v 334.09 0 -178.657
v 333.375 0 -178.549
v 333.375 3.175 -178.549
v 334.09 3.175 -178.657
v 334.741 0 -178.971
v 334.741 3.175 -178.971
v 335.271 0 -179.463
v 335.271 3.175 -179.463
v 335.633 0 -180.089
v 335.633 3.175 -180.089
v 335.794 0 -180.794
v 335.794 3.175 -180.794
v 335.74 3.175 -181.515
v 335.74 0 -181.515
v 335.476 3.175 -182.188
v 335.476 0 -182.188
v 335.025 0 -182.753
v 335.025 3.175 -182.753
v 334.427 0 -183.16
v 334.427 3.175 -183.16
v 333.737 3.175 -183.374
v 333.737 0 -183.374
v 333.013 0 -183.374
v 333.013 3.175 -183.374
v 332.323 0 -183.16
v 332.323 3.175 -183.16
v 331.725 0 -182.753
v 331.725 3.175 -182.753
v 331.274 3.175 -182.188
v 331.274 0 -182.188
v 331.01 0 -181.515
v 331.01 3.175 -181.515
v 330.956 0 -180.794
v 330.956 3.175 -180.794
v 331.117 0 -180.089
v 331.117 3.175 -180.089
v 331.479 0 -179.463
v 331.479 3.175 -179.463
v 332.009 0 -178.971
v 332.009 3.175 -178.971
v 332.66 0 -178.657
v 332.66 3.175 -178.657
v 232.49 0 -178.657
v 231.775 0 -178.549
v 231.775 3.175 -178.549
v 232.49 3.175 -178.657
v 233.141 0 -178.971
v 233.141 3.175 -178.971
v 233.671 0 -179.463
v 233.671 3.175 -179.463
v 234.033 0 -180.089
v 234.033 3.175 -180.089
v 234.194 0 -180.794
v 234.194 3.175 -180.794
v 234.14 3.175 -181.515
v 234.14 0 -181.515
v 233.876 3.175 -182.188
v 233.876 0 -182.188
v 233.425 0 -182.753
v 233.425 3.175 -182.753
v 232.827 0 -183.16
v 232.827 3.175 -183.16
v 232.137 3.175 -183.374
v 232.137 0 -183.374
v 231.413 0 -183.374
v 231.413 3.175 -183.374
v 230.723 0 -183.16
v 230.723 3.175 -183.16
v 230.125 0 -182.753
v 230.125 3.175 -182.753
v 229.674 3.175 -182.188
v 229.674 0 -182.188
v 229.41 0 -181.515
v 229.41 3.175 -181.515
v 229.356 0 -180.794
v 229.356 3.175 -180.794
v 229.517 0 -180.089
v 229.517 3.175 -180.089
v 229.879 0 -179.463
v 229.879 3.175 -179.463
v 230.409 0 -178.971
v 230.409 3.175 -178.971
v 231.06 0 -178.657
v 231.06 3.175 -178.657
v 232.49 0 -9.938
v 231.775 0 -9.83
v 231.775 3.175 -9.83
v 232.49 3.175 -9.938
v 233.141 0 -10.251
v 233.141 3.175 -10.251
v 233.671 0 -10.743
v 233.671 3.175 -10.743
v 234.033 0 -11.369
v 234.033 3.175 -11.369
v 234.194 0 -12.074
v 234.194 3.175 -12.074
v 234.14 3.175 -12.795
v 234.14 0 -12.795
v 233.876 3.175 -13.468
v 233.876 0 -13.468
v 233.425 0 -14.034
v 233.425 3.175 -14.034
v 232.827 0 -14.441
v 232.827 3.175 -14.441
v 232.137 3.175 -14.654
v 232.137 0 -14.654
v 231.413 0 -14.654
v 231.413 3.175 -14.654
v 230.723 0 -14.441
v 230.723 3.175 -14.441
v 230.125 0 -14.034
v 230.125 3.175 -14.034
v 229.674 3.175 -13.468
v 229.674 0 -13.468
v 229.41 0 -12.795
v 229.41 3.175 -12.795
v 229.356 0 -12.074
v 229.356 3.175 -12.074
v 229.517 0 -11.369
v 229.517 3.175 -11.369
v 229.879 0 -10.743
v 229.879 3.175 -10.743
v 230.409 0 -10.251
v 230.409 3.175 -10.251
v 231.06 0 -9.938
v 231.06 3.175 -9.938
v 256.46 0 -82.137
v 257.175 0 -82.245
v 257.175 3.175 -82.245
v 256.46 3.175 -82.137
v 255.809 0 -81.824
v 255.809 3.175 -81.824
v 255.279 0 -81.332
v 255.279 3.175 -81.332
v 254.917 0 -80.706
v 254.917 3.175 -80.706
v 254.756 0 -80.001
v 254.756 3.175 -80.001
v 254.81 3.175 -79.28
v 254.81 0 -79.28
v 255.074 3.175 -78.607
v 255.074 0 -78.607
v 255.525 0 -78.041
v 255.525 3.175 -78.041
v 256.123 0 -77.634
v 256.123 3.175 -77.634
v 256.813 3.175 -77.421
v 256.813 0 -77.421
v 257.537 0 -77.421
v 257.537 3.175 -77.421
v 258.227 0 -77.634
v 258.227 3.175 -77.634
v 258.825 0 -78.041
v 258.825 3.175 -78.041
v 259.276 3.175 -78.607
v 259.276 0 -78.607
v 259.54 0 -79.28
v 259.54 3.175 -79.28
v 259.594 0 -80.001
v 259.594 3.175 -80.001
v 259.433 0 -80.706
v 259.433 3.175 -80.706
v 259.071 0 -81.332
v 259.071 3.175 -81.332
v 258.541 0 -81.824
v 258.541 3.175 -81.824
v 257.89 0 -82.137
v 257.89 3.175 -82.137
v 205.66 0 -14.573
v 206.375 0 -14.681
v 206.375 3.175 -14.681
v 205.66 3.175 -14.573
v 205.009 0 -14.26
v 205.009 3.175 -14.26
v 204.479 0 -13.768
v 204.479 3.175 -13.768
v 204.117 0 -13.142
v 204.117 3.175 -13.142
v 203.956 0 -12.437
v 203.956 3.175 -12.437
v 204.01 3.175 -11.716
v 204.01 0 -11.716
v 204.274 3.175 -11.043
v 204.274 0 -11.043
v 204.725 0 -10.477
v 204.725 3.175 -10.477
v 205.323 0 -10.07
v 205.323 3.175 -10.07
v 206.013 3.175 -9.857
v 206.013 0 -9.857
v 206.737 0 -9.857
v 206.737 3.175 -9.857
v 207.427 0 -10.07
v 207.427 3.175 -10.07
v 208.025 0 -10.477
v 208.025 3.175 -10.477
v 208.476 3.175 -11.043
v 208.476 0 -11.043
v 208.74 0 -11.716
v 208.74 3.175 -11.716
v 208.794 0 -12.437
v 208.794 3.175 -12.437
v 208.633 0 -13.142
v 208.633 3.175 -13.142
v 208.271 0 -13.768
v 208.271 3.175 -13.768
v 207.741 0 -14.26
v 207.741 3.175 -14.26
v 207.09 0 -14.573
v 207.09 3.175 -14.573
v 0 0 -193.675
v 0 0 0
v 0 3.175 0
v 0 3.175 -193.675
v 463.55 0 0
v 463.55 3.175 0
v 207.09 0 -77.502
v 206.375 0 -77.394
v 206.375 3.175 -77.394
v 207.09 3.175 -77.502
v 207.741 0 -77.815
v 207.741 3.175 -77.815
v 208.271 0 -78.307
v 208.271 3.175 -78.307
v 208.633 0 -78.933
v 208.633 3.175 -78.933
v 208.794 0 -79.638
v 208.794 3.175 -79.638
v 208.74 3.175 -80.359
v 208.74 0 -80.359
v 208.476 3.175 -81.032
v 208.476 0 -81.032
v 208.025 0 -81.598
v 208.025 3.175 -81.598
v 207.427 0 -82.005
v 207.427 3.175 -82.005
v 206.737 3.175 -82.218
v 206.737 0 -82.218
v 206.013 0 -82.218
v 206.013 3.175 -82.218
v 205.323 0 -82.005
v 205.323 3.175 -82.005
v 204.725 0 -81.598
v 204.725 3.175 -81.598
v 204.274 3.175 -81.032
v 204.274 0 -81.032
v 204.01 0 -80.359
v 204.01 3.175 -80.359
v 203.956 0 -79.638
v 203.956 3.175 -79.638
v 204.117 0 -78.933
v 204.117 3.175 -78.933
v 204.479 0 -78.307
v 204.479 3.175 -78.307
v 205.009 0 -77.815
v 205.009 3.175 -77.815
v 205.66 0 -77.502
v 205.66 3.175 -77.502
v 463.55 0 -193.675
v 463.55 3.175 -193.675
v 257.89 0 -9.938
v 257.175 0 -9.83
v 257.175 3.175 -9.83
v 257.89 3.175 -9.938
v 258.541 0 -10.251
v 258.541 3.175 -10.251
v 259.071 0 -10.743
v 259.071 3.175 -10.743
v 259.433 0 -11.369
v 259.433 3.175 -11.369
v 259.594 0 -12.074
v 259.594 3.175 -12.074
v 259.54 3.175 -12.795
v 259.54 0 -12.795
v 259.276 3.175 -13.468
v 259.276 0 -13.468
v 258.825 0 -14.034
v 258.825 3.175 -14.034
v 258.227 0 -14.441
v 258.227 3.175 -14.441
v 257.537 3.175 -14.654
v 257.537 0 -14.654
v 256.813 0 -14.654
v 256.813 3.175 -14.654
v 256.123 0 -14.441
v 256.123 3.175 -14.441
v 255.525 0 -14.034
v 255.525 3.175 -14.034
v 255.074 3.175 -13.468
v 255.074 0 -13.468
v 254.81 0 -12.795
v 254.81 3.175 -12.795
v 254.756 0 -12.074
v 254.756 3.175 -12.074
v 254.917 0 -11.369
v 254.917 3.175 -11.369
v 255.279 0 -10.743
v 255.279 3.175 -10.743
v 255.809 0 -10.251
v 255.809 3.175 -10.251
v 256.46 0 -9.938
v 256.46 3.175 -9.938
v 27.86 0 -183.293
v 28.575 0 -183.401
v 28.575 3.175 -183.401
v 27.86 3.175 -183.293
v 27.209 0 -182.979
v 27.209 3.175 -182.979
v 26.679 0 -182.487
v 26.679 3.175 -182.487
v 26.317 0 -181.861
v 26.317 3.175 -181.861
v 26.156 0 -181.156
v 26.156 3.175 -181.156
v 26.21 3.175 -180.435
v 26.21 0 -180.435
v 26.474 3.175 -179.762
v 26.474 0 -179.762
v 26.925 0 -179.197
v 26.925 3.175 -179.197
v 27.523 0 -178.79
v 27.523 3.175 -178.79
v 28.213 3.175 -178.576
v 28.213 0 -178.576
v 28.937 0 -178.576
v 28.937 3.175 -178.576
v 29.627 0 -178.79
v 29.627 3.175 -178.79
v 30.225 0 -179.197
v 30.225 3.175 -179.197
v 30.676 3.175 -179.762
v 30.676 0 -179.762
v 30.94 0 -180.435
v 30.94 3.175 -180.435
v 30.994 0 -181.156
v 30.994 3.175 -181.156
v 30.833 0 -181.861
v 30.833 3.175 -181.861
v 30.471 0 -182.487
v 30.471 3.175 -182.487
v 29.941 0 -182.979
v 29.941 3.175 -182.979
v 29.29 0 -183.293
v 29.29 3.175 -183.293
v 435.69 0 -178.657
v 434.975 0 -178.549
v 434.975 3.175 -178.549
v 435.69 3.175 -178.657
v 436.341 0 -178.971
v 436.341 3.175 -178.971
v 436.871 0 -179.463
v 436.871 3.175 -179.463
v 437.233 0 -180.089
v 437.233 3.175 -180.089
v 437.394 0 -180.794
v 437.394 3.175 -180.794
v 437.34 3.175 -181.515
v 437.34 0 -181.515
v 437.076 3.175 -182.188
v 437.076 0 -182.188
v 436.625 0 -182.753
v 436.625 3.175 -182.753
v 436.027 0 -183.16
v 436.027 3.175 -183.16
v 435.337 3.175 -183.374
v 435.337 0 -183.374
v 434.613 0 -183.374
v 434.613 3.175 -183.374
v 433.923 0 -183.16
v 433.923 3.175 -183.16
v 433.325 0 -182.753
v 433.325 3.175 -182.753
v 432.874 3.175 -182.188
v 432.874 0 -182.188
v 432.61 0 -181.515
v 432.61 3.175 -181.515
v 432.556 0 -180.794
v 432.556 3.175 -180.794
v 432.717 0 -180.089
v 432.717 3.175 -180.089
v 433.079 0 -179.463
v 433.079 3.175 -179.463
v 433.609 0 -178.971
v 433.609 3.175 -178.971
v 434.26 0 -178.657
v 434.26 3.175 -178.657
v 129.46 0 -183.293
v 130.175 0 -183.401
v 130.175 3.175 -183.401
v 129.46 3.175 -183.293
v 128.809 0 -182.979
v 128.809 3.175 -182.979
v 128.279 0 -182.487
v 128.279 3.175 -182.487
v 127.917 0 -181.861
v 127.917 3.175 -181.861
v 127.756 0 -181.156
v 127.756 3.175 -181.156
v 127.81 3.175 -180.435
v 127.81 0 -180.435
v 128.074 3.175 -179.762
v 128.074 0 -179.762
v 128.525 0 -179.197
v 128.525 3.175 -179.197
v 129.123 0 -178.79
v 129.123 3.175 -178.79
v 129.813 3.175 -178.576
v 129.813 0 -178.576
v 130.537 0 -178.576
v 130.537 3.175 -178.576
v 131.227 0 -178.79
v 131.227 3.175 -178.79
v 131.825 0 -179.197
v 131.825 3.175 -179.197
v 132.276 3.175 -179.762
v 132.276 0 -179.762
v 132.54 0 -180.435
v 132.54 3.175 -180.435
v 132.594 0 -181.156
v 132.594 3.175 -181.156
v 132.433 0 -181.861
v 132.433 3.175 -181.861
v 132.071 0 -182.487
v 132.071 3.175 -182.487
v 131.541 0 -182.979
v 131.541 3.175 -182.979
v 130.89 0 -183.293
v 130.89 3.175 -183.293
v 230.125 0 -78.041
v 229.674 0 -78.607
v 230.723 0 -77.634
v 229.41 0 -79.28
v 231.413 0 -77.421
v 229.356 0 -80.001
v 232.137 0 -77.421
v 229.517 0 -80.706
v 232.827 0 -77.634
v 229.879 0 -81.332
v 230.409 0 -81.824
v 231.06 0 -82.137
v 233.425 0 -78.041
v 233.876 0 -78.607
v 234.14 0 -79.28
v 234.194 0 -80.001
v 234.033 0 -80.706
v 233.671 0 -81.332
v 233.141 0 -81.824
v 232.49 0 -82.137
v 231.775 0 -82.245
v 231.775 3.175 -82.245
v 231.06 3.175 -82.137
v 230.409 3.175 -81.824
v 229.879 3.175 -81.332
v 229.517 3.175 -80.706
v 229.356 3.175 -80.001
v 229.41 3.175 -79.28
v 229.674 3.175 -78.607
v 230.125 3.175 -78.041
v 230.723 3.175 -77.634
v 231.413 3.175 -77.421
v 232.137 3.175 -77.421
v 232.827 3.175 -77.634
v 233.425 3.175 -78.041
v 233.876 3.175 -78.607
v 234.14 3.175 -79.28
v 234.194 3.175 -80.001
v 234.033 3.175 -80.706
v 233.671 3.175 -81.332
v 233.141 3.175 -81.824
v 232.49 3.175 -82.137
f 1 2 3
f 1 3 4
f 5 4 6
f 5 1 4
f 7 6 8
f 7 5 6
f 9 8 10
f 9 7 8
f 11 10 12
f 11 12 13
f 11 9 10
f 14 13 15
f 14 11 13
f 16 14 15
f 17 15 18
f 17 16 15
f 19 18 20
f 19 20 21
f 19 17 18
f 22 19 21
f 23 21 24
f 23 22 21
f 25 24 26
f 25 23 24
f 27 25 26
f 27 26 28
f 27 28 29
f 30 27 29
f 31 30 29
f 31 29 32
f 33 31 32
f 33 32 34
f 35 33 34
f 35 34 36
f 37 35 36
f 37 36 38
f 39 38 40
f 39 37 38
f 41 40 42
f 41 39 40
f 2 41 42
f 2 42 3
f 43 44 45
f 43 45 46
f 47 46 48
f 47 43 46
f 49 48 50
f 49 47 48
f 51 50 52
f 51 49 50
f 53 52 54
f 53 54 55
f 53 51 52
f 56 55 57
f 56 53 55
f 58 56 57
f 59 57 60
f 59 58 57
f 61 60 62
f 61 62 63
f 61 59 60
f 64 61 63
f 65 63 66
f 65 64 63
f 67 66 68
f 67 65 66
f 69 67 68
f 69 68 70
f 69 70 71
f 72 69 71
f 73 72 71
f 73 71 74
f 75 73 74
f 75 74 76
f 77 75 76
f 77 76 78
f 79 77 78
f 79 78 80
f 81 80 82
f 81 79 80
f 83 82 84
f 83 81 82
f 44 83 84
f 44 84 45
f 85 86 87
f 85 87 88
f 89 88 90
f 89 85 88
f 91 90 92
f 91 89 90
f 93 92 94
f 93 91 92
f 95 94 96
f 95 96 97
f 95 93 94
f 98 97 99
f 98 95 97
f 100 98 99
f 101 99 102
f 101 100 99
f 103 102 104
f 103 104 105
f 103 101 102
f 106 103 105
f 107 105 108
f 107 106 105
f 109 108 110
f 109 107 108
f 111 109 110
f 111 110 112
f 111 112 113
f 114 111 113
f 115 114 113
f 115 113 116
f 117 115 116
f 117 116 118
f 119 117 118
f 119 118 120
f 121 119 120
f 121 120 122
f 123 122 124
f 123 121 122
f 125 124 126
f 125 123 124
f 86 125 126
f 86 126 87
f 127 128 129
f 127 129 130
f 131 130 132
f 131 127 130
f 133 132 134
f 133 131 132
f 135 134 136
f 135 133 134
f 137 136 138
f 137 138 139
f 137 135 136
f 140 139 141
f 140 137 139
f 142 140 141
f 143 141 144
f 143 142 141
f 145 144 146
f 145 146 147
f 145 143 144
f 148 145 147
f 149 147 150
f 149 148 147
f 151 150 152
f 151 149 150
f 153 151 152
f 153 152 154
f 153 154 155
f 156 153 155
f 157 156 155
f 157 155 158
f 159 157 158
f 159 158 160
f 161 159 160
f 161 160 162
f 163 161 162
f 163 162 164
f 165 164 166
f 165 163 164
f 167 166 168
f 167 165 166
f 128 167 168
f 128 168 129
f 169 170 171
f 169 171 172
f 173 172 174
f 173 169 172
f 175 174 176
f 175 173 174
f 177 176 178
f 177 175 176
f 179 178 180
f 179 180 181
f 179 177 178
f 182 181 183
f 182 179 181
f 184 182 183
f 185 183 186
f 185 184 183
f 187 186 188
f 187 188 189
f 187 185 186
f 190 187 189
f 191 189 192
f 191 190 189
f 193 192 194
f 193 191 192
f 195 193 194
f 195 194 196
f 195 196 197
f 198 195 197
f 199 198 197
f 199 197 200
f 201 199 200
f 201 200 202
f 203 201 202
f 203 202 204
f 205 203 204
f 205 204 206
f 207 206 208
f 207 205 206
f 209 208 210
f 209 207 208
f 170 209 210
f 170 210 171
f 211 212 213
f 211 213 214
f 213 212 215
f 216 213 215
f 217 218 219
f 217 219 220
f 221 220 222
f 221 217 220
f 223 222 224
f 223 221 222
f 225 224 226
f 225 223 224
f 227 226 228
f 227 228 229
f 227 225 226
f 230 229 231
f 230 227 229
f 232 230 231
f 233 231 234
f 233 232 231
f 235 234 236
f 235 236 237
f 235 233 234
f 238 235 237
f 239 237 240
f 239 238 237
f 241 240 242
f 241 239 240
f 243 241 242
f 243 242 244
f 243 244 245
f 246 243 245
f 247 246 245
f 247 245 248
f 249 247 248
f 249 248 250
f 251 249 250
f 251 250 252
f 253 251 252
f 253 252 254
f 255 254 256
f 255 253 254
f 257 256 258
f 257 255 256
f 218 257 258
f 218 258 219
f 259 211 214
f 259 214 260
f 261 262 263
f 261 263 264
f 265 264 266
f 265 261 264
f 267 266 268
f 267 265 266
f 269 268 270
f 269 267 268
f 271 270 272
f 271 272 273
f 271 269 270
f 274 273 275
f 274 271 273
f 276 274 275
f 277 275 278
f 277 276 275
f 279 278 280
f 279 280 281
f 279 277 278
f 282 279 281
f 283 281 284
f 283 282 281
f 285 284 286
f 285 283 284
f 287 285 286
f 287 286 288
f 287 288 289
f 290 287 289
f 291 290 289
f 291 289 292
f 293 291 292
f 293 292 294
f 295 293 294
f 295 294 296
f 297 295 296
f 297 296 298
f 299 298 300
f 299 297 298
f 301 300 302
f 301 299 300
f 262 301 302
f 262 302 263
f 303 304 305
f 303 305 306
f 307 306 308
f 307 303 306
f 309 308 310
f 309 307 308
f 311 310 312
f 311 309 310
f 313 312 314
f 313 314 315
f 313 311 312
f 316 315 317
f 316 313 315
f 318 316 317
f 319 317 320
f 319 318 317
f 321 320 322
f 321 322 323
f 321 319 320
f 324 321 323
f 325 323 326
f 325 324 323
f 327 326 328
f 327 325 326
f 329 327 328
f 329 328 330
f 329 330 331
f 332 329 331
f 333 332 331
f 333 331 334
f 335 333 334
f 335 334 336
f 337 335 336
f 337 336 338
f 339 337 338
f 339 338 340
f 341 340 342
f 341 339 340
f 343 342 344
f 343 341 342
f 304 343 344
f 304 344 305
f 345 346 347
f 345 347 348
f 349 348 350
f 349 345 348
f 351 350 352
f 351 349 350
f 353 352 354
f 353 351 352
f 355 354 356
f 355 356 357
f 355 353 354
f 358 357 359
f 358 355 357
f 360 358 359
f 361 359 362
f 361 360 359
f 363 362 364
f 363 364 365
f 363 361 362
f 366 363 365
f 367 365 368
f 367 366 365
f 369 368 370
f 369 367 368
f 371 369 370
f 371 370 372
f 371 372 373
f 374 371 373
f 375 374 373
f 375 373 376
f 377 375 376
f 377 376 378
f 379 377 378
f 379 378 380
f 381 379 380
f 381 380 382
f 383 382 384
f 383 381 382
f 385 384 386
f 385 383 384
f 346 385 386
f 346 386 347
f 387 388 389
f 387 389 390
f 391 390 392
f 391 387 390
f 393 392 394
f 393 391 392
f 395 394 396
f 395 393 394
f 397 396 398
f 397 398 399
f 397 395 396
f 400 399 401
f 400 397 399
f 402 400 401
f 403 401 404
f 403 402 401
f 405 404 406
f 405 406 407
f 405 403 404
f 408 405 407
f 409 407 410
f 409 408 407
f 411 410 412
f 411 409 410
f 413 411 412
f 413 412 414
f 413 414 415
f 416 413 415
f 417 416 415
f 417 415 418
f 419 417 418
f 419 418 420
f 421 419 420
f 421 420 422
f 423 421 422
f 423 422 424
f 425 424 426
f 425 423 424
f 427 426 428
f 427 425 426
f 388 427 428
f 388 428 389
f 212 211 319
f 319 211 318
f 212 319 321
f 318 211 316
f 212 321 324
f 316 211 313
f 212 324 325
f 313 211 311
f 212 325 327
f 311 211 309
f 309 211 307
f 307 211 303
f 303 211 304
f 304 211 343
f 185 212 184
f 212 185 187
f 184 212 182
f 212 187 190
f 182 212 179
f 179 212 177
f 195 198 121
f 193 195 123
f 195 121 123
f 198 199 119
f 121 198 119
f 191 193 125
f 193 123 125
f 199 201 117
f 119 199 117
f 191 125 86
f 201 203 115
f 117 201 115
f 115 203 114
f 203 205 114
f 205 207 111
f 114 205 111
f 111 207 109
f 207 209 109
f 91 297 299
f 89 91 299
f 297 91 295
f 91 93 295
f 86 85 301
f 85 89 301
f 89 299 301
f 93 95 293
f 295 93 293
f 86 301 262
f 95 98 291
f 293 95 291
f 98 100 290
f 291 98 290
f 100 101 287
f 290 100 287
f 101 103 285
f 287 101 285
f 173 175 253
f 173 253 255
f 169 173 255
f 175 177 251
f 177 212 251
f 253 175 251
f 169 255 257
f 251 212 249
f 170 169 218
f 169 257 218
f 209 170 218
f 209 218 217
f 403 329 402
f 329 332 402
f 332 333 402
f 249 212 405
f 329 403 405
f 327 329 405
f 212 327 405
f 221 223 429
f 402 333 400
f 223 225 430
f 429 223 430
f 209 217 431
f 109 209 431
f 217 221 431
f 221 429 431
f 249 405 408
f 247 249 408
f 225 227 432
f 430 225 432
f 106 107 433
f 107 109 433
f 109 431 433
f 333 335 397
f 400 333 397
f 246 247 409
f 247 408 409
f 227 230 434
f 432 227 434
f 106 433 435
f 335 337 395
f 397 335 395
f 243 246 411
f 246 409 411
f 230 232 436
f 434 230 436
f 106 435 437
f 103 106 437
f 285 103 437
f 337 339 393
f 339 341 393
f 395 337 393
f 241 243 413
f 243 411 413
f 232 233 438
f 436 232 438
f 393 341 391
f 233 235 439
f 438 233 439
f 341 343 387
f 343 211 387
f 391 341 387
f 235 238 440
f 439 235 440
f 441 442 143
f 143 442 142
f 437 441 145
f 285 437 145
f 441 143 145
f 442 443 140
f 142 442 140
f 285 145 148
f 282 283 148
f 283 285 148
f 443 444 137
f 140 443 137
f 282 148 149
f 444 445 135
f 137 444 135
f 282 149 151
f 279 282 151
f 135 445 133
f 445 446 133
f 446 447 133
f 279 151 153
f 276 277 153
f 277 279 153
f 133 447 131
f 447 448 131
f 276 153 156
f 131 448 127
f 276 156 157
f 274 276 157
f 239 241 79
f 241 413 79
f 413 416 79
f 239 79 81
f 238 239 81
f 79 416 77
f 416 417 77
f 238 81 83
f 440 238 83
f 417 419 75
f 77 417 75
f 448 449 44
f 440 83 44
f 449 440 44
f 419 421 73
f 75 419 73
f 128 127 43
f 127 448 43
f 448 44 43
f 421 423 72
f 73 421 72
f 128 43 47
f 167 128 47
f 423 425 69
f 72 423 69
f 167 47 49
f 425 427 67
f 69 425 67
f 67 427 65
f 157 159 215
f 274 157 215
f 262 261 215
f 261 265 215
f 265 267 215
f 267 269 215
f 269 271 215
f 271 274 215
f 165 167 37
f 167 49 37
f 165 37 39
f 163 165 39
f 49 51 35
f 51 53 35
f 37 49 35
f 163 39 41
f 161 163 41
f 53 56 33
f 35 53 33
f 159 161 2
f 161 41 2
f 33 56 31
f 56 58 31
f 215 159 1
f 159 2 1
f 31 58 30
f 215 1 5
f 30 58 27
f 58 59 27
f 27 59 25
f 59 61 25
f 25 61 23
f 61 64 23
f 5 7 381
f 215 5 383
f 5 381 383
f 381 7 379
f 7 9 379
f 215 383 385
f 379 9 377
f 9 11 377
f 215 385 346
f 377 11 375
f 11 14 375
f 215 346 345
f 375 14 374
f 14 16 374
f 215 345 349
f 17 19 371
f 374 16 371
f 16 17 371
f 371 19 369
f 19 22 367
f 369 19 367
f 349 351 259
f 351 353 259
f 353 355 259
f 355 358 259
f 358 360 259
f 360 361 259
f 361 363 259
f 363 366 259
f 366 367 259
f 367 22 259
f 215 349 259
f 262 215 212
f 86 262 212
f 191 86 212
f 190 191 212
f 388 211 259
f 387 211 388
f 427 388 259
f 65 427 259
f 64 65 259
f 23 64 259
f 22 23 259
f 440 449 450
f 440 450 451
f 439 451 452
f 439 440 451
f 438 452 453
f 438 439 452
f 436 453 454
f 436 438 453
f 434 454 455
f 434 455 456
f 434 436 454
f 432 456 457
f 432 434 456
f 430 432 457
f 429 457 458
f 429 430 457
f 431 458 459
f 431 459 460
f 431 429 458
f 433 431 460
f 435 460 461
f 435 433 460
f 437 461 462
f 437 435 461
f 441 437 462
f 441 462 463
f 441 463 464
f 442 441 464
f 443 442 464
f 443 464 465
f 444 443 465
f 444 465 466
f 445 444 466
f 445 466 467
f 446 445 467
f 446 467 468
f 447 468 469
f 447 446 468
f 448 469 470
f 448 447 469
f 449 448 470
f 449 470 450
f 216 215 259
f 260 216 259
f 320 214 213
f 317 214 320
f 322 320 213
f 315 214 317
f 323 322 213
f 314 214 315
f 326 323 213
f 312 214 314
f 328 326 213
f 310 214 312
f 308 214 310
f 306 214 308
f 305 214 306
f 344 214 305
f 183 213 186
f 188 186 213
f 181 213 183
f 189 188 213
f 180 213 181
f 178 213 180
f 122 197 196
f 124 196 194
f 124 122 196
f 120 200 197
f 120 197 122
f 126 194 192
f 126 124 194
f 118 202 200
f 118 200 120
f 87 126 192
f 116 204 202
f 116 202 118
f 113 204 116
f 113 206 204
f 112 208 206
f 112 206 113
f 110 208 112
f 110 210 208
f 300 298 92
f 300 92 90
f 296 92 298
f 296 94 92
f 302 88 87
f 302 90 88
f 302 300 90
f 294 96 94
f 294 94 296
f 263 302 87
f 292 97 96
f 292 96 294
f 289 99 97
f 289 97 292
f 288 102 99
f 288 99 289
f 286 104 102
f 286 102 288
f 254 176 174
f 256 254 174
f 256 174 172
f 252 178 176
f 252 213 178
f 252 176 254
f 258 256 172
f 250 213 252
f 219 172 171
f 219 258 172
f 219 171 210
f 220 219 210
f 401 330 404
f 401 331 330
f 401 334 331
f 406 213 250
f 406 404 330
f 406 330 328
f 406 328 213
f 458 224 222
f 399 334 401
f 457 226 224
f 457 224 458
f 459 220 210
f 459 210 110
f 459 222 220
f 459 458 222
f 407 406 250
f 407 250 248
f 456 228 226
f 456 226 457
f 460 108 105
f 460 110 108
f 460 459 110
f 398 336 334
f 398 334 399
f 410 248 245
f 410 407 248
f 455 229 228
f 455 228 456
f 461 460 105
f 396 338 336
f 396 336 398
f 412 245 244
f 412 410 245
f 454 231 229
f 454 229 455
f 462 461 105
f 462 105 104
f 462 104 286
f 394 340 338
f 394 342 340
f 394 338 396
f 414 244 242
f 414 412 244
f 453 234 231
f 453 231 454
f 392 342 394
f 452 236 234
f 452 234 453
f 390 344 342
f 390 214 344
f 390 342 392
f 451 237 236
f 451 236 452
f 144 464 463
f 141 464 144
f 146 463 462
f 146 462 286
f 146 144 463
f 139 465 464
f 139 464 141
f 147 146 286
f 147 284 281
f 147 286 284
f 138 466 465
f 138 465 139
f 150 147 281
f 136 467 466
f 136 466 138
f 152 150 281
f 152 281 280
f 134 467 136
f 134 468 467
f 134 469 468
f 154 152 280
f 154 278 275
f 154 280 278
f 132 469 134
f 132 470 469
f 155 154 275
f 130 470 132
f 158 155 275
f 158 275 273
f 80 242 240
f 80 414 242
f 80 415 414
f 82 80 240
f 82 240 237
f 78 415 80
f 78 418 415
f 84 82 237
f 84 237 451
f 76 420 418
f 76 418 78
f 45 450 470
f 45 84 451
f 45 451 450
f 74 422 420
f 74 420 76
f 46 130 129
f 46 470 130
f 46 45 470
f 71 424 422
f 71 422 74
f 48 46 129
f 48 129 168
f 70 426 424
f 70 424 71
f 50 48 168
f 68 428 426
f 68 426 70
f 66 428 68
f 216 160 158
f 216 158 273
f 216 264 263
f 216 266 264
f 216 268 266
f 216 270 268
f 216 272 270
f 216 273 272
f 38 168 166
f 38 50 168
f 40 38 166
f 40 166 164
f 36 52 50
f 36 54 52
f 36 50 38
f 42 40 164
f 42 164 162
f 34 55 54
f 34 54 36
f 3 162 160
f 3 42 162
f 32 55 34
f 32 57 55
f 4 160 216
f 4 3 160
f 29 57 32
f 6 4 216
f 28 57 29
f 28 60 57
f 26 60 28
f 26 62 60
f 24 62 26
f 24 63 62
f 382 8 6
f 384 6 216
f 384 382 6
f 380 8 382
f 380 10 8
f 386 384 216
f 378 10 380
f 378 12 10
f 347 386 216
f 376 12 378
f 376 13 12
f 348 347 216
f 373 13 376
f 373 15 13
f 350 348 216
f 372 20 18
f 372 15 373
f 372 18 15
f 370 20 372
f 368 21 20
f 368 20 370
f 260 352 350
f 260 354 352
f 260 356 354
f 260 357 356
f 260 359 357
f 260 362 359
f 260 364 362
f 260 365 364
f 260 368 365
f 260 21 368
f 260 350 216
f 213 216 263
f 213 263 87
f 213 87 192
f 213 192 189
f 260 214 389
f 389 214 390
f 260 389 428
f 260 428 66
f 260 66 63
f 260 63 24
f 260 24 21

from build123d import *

# Parameters (mm, degrees)
SKETCH1_W           = 463.55
SKETCH1_H           = 193.675
SKETCH1_R           = 2.4257
BOSS_EXTRUDE1_DEPTH = 3.175


with BuildPart() as part:
    # Sketch1 → Boss-Extrude1 (new body)
    with BuildSketch(Plane(origin=(0, 0, 0), x_dir=(1, 0, 0), z_dir=(0, 1, 0))):
        with Locations((231.775, 96.8375)):
            Rectangle(SKETCH1_W, SKETCH1_H)
        with Locations(Location((231.775, 12.2555, 0), (0, 0, 270))):
            Circle(SKETCH1_R, mode=Mode.SUBTRACT)
        with Locations(Location((257.175, 12.2555, 0), (0, 0, 270))):
            Circle(SKETCH1_R, mode=Mode.SUBTRACT)
        with Locations(Location((206.375, 12.2555, 0), (0, 0, 90))):
            Circle(SKETCH1_R, mode=Mode.SUBTRACT)
        with Locations(Location((257.175, 79.8195, 0), (0, 0, 90))):
            Circle(SKETCH1_R, mode=Mode.SUBTRACT)
        with Locations(Location((231.775, 79.8195, 0), (0, 0, 90))):
            Circle(SKETCH1_R, mode=Mode.SUBTRACT)
        with Locations(Location((206.375, 79.8195, 0), (0, 0, 270))):
            Circle(SKETCH1_R, mode=Mode.SUBTRACT)
        with Locations(Location((231.775, 180.975, 0), (0, 0, 270))):
            Circle(SKETCH1_R, mode=Mode.SUBTRACT)
        with Locations(Location((333.375, 180.975, 0), (0, 0, 270))):
            Circle(SKETCH1_R, mode=Mode.SUBTRACT)
        with Locations(Location((434.975, 180.975, 0), (0, 0, 270))):
            Circle(SKETCH1_R, mode=Mode.SUBTRACT)
        with Locations(Location((28.575, 180.975, 0), (0, 0, 90))):
            Circle(SKETCH1_R, mode=Mode.SUBTRACT)
        with Locations(Location((130.175, 180.975, 0), (0, 0, 90))):
            Circle(SKETCH1_R, mode=Mode.SUBTRACT)
    extrude(amount=BOSS_EXTRUDE1_DEPTH)


solid = part.part
